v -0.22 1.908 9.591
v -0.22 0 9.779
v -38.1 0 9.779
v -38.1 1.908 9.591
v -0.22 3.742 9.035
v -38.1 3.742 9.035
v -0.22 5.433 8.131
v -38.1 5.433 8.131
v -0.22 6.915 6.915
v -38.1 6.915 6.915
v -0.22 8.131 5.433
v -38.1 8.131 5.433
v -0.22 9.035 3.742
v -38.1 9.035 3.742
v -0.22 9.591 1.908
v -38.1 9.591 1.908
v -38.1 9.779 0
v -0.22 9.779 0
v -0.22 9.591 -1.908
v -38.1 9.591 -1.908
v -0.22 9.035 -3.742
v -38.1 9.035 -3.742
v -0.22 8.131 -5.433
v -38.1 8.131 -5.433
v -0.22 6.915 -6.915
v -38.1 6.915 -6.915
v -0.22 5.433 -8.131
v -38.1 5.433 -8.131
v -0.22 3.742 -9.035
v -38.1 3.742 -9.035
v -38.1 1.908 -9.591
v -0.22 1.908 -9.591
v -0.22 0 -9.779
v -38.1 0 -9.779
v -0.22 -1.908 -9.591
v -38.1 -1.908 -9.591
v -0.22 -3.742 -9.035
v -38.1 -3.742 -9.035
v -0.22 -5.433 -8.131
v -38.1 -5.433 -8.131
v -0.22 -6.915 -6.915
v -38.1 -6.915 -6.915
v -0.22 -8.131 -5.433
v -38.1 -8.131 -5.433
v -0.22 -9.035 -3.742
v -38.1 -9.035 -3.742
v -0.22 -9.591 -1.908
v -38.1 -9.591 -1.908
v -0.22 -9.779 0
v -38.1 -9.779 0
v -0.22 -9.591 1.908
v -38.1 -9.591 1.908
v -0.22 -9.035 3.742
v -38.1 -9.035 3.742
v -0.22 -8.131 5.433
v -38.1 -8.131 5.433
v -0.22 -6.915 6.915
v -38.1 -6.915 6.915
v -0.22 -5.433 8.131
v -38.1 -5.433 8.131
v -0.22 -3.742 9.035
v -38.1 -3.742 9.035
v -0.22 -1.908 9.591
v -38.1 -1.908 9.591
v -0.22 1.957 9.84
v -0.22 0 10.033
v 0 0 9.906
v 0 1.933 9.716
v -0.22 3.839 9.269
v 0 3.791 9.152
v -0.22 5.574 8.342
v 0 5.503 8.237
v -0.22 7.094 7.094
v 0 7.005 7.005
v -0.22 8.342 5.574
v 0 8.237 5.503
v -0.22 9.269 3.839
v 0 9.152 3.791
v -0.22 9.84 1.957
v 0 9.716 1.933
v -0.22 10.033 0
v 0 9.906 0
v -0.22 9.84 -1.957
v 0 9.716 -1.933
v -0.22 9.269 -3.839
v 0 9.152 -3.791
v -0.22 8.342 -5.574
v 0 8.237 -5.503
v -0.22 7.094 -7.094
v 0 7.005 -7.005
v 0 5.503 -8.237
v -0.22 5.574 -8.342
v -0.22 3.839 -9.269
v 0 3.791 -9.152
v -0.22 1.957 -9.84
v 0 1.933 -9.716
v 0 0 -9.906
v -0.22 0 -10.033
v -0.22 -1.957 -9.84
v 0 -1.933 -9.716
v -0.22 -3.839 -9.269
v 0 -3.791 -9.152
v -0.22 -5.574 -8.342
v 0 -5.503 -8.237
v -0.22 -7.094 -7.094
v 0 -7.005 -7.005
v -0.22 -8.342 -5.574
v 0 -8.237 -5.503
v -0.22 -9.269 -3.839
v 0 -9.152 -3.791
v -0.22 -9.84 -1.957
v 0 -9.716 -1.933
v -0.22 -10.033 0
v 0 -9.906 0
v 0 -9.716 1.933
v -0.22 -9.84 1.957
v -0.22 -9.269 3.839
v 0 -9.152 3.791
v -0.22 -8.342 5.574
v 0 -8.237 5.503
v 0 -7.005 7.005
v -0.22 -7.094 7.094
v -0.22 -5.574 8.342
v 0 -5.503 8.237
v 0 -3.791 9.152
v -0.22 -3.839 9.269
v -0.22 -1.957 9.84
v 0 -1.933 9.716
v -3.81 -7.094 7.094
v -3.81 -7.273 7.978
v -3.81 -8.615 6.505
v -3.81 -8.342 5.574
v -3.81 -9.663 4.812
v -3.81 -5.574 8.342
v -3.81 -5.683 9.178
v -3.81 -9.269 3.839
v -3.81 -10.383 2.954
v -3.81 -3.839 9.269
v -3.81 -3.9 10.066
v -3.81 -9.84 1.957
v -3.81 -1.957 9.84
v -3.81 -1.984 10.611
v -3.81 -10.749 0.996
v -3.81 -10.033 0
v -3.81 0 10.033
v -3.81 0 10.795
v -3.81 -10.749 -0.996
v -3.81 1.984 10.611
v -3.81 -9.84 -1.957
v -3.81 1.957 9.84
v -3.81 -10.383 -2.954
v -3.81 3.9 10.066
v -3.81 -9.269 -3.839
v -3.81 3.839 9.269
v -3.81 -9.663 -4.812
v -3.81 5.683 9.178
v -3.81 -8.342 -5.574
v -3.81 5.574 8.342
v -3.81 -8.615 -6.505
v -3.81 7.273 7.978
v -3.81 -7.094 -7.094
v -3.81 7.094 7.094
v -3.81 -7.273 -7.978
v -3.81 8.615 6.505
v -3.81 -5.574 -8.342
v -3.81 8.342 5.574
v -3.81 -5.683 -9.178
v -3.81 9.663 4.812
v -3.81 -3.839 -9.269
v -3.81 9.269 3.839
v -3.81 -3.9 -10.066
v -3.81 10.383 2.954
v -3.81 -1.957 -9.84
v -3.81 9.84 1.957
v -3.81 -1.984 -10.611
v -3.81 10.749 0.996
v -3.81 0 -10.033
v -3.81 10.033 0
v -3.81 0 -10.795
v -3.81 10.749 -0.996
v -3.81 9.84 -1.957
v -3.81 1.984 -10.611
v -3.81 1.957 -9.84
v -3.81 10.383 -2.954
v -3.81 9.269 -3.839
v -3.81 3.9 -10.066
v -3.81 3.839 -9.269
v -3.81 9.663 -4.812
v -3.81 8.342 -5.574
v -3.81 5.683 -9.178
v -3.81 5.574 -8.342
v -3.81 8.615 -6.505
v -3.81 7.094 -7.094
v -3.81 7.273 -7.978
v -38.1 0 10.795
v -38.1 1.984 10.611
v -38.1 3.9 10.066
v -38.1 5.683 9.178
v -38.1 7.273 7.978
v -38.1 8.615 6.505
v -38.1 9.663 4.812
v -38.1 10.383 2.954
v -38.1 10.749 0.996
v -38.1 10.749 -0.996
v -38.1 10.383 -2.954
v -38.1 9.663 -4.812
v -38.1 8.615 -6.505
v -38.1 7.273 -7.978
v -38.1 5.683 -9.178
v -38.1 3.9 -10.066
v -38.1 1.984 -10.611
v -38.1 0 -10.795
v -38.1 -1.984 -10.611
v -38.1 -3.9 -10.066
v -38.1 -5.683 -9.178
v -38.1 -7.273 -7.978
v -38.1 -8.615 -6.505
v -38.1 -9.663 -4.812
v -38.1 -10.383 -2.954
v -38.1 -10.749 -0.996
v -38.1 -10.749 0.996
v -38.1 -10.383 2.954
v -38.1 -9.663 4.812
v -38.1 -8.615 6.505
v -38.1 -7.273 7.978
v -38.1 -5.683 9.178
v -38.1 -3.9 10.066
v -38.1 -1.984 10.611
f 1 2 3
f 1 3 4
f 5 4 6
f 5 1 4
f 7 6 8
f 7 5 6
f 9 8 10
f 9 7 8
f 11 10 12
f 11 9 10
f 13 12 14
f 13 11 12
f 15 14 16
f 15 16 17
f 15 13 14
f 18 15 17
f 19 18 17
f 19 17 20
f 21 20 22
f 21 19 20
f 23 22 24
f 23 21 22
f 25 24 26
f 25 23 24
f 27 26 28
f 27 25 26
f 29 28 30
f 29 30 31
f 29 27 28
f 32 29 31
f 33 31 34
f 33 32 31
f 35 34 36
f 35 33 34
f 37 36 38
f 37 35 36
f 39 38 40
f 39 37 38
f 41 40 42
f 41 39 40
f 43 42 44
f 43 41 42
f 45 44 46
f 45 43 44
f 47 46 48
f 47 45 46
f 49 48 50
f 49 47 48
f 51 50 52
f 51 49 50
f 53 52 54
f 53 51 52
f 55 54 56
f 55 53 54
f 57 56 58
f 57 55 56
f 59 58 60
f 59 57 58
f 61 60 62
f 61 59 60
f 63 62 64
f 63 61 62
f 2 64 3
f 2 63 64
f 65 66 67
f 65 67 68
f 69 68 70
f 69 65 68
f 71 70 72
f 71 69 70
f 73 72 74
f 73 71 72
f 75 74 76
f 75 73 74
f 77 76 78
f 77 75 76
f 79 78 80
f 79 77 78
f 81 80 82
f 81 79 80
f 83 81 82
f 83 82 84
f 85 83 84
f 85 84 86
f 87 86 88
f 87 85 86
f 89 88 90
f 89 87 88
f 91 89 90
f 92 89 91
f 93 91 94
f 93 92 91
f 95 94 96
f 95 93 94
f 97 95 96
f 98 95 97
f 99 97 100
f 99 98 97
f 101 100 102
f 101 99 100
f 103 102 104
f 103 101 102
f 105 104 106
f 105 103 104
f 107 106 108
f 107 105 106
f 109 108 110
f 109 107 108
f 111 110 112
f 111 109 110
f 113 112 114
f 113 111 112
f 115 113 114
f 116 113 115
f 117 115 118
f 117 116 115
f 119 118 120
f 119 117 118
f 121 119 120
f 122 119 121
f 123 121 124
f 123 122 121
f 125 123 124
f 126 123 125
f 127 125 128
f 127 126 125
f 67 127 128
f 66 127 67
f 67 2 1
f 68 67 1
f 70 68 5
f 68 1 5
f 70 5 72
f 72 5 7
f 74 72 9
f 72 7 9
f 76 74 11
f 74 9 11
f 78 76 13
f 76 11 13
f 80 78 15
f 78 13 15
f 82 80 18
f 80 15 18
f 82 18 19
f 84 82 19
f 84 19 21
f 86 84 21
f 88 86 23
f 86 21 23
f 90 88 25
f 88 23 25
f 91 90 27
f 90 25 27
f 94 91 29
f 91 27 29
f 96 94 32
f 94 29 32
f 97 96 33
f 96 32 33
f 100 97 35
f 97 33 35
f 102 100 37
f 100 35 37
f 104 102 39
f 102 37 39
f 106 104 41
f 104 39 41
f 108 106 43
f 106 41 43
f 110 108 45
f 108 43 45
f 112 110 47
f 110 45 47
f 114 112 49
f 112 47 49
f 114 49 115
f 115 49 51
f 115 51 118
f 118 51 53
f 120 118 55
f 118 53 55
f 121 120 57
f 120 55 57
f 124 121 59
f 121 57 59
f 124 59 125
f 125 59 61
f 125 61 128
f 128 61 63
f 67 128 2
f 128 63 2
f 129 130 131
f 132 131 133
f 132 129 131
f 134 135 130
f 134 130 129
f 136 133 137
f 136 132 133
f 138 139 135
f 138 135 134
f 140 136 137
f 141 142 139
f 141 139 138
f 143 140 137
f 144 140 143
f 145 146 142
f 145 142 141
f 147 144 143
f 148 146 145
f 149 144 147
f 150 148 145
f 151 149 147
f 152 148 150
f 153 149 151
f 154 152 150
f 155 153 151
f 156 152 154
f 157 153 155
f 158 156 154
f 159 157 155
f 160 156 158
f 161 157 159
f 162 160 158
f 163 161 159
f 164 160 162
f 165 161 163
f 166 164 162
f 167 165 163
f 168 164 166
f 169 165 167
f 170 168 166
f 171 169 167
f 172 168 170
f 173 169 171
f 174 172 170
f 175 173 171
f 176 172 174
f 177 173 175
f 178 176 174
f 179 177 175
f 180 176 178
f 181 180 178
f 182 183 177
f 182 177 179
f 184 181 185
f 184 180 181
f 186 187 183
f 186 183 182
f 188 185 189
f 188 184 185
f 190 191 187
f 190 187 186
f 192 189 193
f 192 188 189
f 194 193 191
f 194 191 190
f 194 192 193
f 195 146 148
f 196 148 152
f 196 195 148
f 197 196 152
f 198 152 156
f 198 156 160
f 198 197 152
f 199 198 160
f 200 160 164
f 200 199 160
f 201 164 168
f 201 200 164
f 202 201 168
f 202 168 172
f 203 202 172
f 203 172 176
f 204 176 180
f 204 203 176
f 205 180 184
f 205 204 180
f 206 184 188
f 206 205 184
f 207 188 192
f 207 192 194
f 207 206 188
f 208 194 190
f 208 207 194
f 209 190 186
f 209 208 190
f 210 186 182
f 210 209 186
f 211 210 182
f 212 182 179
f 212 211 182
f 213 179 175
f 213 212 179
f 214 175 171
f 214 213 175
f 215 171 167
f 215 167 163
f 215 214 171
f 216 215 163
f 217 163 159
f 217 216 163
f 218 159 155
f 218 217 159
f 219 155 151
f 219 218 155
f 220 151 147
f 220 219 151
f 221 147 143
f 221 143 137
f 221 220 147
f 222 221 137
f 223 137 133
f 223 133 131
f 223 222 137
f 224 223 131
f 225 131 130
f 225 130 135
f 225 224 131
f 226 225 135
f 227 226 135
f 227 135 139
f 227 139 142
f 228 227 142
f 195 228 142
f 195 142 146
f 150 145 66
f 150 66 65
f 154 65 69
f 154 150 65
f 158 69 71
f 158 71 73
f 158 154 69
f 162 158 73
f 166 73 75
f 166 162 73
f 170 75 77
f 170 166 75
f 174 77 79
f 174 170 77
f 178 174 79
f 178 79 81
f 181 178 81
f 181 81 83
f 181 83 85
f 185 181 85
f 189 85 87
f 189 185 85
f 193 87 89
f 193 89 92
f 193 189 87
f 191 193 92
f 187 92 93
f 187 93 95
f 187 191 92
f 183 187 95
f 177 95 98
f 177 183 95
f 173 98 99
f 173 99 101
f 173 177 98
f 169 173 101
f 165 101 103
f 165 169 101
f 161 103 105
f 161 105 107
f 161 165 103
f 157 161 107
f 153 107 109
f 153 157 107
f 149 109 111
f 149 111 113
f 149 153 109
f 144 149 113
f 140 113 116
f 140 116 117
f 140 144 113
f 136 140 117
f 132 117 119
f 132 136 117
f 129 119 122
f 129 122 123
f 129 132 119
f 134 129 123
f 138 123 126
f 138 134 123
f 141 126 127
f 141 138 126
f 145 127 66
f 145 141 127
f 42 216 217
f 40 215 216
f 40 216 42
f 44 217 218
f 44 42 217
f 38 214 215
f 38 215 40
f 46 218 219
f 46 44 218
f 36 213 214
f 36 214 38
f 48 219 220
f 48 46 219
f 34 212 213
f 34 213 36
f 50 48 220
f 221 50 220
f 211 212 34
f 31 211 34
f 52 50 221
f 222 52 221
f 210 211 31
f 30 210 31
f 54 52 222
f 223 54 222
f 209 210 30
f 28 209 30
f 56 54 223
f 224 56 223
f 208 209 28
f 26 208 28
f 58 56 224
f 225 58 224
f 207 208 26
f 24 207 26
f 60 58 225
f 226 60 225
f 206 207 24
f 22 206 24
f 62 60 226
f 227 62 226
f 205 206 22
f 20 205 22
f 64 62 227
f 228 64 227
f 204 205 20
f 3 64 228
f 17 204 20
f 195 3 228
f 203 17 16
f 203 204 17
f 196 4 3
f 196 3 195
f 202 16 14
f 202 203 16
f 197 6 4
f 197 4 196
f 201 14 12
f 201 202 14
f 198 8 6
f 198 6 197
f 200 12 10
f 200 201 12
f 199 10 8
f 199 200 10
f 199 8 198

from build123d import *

# Parameters (mm, degrees)
F2_SIZE2 = 0.21996
F2_SIZE  = 0.12699


# Not quite as in the source:
# - a fillet or chamfer is up to 0.001 mm smaller than in the source, because OpenCascade refuses the exact size


with BuildPart() as f1:
    # F0 (on Front) → F1 (revolve)
    with BuildSketch(Plane.XZ):
        Polygon((-38.1, 9.779), (0, 9.779), (0, 10.033), (-3.81, 10.033), (-3.81, 10.795), (-38.1, 10.795), align=None)
    revolve(axis=Axis((-19.05, 0, 0), (-1, 0, 0)))

    # F2 (size 0.127 and 0.2199704526 in the source; OpenCascade refuses exactly that, so slightly less here)
    f2_edges = [f1.edges().sort_by_distance(p)[0] for p in [
        (0, 0, -10.033),
        (0, 0, -9.779),
    ]]
    f2_side = f1.faces().sort_by_distance((0, 0, -9.807378))[0]
    chamfer(f2_edges, length=F2_SIZE, length2=F2_SIZE2, reference=f2_side)


solid = f1.part
